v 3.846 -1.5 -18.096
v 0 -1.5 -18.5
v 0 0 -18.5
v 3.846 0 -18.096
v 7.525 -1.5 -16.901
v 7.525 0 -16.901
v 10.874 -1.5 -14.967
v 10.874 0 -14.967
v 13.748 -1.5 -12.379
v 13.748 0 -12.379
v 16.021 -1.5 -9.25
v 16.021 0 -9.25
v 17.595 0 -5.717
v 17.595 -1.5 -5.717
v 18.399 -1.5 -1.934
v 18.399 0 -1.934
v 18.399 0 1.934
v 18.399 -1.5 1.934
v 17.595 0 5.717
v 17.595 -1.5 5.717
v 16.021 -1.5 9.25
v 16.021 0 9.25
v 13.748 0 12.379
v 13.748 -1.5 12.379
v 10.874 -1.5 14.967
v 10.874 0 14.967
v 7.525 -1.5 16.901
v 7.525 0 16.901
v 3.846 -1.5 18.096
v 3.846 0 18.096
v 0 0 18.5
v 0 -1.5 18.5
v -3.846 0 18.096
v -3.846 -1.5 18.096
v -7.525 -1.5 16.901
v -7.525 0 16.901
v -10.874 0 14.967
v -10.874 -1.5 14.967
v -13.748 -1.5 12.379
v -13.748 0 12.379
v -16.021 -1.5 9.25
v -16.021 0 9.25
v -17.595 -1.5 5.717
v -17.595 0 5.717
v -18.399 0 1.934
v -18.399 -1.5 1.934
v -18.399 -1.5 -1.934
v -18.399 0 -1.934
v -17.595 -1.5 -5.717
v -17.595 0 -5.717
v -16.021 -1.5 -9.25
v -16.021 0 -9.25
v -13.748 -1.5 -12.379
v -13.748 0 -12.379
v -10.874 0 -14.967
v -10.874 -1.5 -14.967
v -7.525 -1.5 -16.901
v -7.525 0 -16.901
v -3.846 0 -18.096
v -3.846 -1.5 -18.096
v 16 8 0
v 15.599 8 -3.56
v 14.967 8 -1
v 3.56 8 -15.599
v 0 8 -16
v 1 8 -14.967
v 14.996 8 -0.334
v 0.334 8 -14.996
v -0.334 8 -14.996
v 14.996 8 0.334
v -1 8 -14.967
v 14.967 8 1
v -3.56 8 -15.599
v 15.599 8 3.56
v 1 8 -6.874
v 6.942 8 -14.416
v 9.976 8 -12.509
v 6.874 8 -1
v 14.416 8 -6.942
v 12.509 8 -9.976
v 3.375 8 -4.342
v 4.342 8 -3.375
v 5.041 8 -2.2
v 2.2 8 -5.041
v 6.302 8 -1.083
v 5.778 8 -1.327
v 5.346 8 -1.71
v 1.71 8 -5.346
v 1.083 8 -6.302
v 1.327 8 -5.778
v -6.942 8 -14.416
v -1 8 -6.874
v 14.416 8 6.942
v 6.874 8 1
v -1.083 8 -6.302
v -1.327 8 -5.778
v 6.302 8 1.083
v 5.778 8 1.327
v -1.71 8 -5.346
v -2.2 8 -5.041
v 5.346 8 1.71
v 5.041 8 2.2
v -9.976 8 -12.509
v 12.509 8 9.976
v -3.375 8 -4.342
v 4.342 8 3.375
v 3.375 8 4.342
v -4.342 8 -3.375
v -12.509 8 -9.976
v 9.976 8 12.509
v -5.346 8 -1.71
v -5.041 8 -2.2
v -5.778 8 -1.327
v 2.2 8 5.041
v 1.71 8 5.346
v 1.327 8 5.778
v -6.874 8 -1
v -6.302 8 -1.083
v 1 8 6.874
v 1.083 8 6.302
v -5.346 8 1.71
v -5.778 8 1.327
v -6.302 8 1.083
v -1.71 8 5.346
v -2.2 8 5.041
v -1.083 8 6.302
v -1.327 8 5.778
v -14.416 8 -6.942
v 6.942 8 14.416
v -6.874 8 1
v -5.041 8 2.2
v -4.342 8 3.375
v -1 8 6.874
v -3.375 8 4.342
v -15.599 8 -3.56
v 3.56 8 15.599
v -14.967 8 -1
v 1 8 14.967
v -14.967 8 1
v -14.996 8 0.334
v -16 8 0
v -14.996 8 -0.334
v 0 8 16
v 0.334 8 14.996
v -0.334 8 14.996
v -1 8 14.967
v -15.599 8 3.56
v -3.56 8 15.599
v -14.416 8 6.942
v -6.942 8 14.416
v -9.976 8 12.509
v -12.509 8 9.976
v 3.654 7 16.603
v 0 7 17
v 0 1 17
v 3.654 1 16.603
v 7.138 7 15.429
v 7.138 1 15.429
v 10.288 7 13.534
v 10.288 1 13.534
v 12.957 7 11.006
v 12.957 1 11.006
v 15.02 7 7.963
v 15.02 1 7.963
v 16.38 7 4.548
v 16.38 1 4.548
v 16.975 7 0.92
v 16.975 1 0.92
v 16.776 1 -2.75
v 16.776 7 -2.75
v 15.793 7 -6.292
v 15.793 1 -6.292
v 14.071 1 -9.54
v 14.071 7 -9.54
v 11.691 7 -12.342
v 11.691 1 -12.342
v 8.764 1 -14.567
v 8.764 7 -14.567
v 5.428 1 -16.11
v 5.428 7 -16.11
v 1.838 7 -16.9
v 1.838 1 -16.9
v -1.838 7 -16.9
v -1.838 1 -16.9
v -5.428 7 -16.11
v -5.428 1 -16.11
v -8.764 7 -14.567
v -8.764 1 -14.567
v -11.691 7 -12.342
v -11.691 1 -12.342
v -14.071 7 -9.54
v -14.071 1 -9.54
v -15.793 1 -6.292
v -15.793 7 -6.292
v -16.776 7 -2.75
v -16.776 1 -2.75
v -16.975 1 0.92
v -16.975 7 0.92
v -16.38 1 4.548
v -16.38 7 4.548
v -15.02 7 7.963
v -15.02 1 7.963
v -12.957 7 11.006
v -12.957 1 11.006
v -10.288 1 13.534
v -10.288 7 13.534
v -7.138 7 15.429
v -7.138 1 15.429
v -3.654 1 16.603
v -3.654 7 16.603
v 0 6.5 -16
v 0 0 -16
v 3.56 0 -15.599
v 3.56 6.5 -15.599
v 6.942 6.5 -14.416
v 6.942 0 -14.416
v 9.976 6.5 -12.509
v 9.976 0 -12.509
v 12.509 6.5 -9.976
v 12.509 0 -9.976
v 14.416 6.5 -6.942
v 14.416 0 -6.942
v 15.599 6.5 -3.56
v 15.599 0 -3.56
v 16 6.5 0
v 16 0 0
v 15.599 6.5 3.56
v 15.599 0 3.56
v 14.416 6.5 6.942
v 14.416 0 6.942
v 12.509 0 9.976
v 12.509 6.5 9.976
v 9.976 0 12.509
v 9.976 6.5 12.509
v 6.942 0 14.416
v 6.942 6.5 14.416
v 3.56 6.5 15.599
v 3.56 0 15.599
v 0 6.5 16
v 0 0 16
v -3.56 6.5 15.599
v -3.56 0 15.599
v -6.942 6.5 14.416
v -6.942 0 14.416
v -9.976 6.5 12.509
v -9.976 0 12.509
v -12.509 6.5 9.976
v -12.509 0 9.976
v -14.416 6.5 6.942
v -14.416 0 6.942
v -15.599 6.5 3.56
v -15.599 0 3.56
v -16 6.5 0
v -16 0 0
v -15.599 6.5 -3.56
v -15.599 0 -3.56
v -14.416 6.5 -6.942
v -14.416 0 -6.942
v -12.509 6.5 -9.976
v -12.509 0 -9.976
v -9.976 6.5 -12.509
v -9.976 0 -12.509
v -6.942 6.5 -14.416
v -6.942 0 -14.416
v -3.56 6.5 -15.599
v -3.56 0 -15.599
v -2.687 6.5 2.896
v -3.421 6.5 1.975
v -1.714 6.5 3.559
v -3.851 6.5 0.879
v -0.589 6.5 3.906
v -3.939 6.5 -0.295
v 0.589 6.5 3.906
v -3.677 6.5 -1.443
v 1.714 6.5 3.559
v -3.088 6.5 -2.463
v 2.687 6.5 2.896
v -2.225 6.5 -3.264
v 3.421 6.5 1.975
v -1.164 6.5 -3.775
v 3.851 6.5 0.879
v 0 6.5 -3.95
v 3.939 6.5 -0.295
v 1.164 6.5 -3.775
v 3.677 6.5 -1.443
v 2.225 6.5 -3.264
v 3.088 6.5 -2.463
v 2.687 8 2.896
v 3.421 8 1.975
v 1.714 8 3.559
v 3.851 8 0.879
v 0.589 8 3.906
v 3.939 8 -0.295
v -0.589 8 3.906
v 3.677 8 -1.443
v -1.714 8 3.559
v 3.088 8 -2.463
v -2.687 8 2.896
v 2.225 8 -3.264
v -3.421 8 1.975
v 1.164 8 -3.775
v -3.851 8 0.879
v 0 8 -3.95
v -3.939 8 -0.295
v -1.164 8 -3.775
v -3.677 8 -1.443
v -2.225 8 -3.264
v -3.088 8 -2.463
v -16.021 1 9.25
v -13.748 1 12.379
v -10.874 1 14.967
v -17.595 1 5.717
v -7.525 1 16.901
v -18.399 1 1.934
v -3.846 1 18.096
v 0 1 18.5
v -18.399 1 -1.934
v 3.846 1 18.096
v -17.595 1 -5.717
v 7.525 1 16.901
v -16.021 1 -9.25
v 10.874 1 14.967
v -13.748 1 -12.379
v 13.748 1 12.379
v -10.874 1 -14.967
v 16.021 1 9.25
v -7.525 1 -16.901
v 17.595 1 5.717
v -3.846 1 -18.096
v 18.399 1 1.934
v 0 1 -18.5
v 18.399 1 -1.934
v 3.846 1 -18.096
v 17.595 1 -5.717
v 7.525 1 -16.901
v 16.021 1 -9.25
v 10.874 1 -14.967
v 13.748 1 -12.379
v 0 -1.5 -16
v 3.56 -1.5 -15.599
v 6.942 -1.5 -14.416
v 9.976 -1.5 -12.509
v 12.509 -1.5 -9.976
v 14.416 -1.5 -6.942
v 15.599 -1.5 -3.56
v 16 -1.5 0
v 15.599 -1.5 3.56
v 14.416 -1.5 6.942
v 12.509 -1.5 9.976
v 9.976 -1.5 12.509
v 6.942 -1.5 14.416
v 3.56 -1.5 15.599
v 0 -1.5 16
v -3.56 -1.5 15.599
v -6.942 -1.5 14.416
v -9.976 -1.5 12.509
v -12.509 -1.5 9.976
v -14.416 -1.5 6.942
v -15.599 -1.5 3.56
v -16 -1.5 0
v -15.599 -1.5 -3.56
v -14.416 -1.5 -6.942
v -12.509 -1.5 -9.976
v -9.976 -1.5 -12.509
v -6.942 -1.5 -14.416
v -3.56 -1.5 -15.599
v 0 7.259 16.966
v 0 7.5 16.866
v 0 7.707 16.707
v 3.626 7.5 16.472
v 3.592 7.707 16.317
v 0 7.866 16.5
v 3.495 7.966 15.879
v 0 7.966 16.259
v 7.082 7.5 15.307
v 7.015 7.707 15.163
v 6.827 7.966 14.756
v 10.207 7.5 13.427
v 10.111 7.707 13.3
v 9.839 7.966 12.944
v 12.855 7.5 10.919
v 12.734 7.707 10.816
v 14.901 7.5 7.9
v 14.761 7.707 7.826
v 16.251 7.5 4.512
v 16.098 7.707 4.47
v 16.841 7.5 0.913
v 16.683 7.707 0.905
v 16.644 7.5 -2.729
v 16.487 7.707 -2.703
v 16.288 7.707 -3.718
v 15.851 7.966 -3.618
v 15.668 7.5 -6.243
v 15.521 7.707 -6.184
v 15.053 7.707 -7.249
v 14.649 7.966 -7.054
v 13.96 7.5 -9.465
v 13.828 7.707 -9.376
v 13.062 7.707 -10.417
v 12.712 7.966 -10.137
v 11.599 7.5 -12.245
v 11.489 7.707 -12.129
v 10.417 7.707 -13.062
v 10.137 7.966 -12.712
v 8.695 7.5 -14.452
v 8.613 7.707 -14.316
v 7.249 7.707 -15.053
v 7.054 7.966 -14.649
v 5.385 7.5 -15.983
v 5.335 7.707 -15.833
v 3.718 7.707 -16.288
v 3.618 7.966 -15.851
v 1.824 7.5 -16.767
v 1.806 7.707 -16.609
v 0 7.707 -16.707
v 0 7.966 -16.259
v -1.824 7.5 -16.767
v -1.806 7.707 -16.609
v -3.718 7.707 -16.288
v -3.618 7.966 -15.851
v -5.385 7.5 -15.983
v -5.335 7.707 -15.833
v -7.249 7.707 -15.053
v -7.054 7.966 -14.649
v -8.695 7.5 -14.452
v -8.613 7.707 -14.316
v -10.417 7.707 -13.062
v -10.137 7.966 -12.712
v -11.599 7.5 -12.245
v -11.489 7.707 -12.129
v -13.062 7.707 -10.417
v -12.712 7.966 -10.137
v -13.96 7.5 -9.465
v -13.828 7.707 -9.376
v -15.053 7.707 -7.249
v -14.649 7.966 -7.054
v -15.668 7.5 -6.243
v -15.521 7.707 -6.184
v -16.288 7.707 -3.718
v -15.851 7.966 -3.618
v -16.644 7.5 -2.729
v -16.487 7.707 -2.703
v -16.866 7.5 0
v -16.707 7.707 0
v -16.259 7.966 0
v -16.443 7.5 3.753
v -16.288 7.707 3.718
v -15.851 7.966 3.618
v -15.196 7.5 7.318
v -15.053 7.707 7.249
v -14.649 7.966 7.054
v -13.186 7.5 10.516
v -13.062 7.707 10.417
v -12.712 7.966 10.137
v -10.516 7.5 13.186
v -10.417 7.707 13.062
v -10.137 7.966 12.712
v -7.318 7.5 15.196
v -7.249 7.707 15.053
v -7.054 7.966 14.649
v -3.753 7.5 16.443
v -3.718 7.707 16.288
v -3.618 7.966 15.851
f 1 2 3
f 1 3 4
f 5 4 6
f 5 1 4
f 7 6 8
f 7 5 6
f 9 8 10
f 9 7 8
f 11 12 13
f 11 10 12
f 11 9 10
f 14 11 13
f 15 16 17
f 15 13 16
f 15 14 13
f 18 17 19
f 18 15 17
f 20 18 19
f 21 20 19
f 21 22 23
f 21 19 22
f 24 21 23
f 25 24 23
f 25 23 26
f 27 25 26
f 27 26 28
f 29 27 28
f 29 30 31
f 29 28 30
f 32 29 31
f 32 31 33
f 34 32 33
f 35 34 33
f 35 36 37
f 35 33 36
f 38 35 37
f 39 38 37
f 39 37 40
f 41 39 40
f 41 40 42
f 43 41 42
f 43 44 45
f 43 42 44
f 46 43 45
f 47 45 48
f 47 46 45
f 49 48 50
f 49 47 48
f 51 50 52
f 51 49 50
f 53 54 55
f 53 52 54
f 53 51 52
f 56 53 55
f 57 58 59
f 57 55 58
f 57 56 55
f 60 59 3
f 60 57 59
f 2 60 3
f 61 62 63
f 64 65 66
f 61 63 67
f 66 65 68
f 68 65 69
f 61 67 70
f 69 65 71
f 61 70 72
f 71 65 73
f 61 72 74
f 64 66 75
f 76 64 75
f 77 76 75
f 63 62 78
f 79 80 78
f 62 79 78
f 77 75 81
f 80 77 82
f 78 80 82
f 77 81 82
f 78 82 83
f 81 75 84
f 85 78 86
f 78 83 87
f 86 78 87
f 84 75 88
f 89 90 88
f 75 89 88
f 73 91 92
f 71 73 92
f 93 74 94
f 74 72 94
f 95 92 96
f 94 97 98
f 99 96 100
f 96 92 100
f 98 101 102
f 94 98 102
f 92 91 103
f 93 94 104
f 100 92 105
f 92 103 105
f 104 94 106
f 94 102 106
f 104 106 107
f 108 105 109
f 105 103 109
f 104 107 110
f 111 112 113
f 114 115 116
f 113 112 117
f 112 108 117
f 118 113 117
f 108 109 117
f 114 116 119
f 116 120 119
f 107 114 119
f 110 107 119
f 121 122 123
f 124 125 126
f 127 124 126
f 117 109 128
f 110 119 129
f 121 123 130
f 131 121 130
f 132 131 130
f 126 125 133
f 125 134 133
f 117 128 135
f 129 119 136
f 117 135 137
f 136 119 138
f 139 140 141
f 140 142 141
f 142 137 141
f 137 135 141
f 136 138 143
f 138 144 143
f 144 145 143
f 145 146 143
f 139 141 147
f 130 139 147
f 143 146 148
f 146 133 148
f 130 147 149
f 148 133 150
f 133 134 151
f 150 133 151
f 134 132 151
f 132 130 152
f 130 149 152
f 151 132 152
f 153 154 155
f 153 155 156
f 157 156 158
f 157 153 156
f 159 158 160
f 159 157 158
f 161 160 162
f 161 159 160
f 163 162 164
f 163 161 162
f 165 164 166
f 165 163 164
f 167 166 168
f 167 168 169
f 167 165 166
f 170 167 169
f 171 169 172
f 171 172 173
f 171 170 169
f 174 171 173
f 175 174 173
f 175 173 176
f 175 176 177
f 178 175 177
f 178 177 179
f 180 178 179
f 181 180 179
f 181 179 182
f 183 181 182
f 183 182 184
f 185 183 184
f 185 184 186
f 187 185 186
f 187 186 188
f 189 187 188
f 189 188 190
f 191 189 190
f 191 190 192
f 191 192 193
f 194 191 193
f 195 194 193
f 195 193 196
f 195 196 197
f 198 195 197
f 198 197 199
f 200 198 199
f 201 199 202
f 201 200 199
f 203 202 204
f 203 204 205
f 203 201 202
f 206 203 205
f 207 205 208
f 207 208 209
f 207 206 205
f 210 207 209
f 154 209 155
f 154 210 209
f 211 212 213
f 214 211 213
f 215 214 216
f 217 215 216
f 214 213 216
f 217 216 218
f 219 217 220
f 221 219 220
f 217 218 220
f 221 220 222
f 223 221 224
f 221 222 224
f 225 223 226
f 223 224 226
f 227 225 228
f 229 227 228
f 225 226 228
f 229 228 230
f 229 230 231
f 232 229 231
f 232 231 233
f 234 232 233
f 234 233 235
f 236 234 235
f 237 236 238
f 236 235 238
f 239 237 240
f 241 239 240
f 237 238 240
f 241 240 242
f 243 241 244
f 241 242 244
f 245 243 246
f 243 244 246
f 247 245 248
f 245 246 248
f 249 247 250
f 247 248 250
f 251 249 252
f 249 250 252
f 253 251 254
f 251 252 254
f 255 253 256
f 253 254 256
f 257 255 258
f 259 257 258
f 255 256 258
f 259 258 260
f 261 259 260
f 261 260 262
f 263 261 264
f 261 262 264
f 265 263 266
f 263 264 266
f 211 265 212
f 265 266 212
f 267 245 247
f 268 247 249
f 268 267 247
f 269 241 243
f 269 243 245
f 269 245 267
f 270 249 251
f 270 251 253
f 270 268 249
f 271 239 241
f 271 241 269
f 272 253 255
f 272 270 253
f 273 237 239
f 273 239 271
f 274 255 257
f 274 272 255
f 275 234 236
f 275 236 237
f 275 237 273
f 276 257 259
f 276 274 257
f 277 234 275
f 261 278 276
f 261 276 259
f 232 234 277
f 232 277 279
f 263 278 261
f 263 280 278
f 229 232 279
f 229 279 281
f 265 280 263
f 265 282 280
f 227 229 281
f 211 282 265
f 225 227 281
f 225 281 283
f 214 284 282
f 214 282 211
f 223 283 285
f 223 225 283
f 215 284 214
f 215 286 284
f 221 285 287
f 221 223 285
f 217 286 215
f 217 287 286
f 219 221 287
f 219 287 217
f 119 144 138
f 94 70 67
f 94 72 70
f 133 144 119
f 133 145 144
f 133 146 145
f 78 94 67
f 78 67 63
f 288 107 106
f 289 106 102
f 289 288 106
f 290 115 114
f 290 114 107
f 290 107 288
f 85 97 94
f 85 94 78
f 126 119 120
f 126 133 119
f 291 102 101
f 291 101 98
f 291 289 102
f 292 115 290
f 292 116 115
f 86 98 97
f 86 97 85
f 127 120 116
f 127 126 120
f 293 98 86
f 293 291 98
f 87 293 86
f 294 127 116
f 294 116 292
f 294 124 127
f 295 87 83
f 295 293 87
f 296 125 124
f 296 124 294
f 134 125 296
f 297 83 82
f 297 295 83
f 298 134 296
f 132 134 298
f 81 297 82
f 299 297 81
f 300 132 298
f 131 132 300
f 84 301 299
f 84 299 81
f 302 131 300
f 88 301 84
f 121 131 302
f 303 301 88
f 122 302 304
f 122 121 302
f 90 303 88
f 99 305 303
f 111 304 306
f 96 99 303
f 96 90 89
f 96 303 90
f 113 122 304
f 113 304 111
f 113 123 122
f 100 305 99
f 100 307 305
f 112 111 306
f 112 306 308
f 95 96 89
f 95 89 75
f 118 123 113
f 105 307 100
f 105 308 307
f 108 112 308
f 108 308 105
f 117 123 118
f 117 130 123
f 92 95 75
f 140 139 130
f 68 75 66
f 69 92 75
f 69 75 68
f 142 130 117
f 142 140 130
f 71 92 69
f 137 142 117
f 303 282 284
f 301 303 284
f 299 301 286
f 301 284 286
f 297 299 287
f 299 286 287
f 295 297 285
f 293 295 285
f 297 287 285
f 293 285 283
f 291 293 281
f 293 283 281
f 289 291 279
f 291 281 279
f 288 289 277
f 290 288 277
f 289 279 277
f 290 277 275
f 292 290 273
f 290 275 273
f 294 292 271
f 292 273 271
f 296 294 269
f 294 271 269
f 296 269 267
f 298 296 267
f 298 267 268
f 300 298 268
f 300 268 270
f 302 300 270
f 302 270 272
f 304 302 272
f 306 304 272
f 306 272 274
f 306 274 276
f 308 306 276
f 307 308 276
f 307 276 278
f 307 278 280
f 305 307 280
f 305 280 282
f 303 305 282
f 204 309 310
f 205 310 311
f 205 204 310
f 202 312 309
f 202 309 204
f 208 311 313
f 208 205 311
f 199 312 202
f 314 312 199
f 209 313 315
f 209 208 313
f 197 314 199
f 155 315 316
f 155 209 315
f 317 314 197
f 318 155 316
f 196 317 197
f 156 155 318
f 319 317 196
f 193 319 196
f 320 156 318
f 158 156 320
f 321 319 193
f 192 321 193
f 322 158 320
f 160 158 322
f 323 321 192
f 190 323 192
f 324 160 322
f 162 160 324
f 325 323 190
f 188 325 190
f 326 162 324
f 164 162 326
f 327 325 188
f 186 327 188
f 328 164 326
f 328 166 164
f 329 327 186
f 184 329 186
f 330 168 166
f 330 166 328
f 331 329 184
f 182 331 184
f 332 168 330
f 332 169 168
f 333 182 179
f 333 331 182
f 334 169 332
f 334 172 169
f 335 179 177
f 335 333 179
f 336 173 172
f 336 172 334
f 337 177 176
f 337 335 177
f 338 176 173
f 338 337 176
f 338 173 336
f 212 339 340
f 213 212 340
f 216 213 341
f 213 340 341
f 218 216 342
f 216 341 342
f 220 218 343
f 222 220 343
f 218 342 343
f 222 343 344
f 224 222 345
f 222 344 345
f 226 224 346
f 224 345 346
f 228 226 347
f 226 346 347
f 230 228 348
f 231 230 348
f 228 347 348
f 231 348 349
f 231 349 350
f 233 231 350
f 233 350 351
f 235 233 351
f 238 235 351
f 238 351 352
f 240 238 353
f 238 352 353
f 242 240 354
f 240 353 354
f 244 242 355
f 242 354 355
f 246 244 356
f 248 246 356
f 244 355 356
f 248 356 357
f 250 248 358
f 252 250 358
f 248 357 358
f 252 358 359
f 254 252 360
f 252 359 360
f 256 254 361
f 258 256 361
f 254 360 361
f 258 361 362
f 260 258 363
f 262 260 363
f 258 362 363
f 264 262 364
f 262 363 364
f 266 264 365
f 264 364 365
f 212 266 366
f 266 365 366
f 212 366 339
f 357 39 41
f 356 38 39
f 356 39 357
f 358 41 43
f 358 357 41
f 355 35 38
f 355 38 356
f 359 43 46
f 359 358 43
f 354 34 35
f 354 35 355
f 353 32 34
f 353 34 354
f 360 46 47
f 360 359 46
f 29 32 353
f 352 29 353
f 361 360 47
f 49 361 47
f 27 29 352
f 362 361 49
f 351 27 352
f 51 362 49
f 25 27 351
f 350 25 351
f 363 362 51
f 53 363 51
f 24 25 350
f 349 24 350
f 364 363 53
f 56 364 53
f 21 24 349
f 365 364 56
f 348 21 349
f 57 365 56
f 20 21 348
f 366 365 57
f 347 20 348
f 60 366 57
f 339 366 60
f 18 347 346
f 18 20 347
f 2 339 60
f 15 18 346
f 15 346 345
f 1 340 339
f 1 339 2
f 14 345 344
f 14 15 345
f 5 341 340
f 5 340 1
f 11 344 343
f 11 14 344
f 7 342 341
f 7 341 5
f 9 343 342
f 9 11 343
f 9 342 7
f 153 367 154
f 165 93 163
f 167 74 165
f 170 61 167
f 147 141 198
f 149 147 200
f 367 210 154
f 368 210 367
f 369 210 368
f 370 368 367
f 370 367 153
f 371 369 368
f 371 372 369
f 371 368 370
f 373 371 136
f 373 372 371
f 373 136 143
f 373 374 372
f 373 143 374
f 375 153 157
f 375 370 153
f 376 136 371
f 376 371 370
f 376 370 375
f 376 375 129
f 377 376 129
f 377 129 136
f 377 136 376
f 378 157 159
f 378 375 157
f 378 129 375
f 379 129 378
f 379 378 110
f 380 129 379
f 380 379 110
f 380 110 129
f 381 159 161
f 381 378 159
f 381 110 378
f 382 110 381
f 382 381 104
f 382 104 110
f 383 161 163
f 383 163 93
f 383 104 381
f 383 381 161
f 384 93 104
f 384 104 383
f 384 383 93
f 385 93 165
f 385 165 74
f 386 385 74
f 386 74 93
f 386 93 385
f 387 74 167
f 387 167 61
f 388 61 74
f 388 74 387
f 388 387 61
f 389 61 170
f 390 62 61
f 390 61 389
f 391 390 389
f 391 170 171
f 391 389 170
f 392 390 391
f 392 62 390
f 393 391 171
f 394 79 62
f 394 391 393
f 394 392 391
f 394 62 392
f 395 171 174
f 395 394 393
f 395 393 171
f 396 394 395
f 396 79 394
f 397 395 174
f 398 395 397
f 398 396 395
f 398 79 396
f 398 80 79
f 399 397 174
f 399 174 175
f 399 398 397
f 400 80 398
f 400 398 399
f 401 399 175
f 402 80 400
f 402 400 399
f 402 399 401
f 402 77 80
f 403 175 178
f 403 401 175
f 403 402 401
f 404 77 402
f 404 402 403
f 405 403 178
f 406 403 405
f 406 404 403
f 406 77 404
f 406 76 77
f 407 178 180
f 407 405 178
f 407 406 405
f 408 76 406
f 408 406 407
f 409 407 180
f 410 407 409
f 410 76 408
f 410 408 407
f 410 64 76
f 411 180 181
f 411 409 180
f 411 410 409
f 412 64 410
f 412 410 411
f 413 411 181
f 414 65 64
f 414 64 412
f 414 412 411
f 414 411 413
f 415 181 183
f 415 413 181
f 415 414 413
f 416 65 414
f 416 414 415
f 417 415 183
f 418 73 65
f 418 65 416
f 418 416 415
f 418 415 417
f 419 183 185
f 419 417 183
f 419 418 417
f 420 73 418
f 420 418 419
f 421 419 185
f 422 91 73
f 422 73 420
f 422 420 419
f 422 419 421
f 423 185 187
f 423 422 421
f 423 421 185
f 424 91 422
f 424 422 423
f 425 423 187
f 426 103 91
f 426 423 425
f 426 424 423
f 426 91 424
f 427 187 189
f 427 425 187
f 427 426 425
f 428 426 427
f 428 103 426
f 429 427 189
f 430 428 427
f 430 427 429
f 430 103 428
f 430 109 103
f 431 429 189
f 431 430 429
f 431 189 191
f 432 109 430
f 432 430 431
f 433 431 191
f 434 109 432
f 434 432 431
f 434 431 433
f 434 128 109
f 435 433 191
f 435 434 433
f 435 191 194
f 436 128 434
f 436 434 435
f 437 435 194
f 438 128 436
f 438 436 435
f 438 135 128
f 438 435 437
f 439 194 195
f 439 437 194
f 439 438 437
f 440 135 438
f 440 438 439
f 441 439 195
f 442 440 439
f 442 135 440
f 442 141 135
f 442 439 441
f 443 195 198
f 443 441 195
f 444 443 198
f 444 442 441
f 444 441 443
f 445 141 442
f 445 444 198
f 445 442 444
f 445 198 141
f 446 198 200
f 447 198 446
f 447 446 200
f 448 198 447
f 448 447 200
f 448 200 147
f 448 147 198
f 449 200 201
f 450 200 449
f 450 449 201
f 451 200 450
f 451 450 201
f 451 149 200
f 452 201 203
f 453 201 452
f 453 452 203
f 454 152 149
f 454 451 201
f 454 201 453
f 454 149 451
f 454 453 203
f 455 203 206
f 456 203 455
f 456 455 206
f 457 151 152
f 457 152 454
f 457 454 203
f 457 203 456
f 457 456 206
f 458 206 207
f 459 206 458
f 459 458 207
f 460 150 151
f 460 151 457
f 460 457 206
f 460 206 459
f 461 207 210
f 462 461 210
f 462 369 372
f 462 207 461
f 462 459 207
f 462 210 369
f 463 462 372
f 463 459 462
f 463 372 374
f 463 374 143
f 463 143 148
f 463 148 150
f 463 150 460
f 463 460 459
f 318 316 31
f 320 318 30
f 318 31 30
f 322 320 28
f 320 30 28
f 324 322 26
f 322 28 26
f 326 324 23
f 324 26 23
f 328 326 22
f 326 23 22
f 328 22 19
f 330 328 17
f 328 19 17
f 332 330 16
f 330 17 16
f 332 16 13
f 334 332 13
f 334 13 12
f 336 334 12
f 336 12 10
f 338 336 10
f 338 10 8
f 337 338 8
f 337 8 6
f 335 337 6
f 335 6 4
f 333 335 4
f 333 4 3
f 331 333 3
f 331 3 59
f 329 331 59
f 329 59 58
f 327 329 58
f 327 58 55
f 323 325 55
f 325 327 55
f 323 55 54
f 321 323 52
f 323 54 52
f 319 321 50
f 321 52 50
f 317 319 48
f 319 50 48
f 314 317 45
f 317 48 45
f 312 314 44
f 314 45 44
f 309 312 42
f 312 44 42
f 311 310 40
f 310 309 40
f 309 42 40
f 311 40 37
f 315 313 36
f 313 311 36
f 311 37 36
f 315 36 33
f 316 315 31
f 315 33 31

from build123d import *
from build123d.topology import SkipClean

# Parameters (mm, degrees)
SKETCH_1_R          = 18.5
EXTRUDE_1_DEPTH     = 20
SKETCH_2_R          = 16
CUT_EXTRUDE_1_DEPTH = 6.5
SKETCH_3_R          = 3.95
CUT_EXTRUDE_2_DEPTH = 7
SKETCH_4_R          = 3
CUT_EXTRUDE_3_DEPTH = 17
SKETCH_5_R          = 25.146051565
SKETCH_5_R_2        = 17
CUT_EXTRUDE_4_DEPTH = 19
CUT_EXTRUDE_5_DEPTH = 12
FILLET_5_R          = 1
FILLET_7_R          = 2
CUT_EXTRUDE_6_REACH = 34.932
SKETCH_9_R          = 5.408326913
SKETCH_9_R_2        = 4.5
FILLET_8_R          = 0.8
EXTRUDE_START       = 1.5
SKETCH_10_R         = 18.5
SKETCH_10_R_2       = 16
EXTRUDE_2_DEPTH     = 1.5
SKETCH_11_R         = 16
CUT_EXTRUDE_7_DEPTH = 29.783675929


with BuildPart() as part:
    # 草图1 → 凸台-拉伸1 (new body)
    with BuildSketch(Plane(origin=(0, 0, 0), x_dir=(1, 0, 0), z_dir=(0, 1, 0))):
        with Locations(Location((0, 0, 0), (0, 0, 270))):
            Circle(SKETCH_1_R)
    extrude(amount=EXTRUDE_1_DEPTH)

    # 草图2 → 切除-拉伸1 (cut)
    with BuildSketch(Plane.XZ):
        with Locations(Location((0, 0, 0), (0, 0, 270))):
            Circle(SKETCH_2_R)
    extrude(amount=-CUT_EXTRUDE_1_DEPTH, mode=Mode.SUBTRACT)

    # 草图3 → 切除-拉伸2 (cut)
    with BuildSketch(Plane.XZ.offset(-6.5)):
        with Locations(Location((0, 0, 0), (0, 0, 270))):
            Circle(SKETCH_3_R)
    extrude(amount=-CUT_EXTRUDE_2_DEPTH, mode=Mode.SUBTRACT)

    # 草图4 → 切除-拉伸3 (cut)
    with BuildSketch(Plane.XZ.offset(-13.5)):
        with Locations(Location((0, 0, 0), (0, 0, 270))):
            Circle(SKETCH_4_R)
    extrude(amount=-CUT_EXTRUDE_3_DEPTH, mode=Mode.SUBTRACT)

    # 草图5 → 切除-拉伸4 (cut)
    with BuildSketch(Plane(origin=(0, 20, 0), x_dir=(1, 0, 0), z_dir=(0, 1, 0))):
        Circle(SKETCH_5_R)
        with Locations(Location((0, 0, 0), (0, 0, 270))):
            Circle(SKETCH_5_R_2, mode=Mode.SUBTRACT)
    extrude(amount=-CUT_EXTRUDE_4_DEPTH, mode=Mode.SUBTRACT)

    # 草图6 → 切除-拉伸5 (cut)
    with BuildSketch(Plane(origin=(0, 20, 0), x_dir=(1, 0, 0), z_dir=(0, 1, 0))):
        with BuildLine():
            Line((-1, 15.467708298), (-1, 5.408326913))
            ThreePointArc((-1, 5.408326913), (-3.889087297, 3.889087297), (-5.408326913, 1))
            Line((-5.408326913, 1), (-15.467708298, 1))
            ThreePointArc((-15.467708298, 1), (-10.960155108, 10.960155108), (-1, 15.467708298))
        make_face()
        with BuildLine():
            Line((1, 15.467708298), (1, 5.408326913))
            ThreePointArc((1, 5.408326913), (3.889087297, 3.889087297), (5.408326913, 1))
            Line((5.408326913, 1), (15.467708298, 1))
            ThreePointArc((15.467708298, 1), (10.960155108, 10.960155108), (1, 15.467708298))
        make_face()
        with BuildLine():
            Line((-15.467708298, -1), (-5.408326913, -1))
            ThreePointArc((-5.408326913, -1), (-3.889087297, -3.889087297), (-1, -5.408326913))
            Line((-1, -5.408326913), (-1, -15.467708298))
            ThreePointArc((-1, -15.467708298), (-10.960155108, -10.960155108), (-15.467708298, -1))
        make_face()
        with BuildLine():
            Line((1, -5.408326913), (1, -15.467708298))
            ThreePointArc((1, -15.467708298), (10.960155108, -10.960155108), (15.467708298, -1))
            Line((15.467708298, -1), (5.408326913, -1))
            ThreePointArc((5.408326913, -1), (3.889087297, -3.889087297), (1, -5.408326913))
        make_face()
    extrude(amount=-CUT_EXTRUDE_5_DEPTH, mode=Mode.SUBTRACT)

    # 草图8 → 切除-旋转2 (revolve, cut)
    with BuildSketch(Plane.XY, mode=Mode.PRIVATE) as cut_revolve_2_sk:
        Polygon((-19.272016982, 8), (-19.272016982, 20.821833332), (-5.408326913, 20.821833332), (-5.408326913, 16), (-15, 8), (-17, 8), align=None)
    revolve(cut_revolve_2_sk.sketch.rotate(Axis((0, 13.5, 0), (0, -1, 0)), 270), axis=Axis((0, 13.5, 0), (0, -1, 0)), mode=Mode.SUBTRACT)

    # 圆角5
    fillet_5_edges = [part.edges().sort_by_distance(p)[0] for p in [
        (0, 8, -17),
    ]]
    fillet(fillet_5_edges, radius=FILLET_5_R)

    # 圆角7
    fillet_7_edges = [part.edges().sort_by_distance(p)[0] for p in [
        (-1, 11.96176972, 5.408326913),
        (-5.408326913, 11.96176972, 1),
        (-5.408326913, 11.96176972, -1),
        (-1, 11.96176972, -5.408326913),
        (1, 11.96176972, -5.408326913),
        (5.408326913, 11.96176972, -1),
        (5.408326913, 11.96176972, 1),
        (1, 11.96176972, 5.408326913),
    ]]
    fillet(fillet_7_edges, radius=FILLET_7_R)

    # 切除-拉伸6: up to this cone (the profile starts outside it)
    with SkipClean():  # the faces are left unmerged after this step: merging them gives an invalid solid
        cut_extrude_6_end = Plane(origin=(0, 20, 0), z_dir=(0, -1, 0)).offset(-0.510850748) * Cone(1.199e-06, 43.828361396, 36.555341117, align=(Align.CENTER, Align.CENTER, Align.MIN), mode=Mode.PRIVATE)
        # 草图9 → 切除-拉伸6 (cut, up to the surface)
        with BuildSketch(Plane(origin=(0, 20, 0), x_dir=(1, 0, 0), z_dir=(0, 1, 0)), mode=Mode.PRIVATE) as cut_extrude_6_sk1:
            Circle(SKETCH_9_R)
            with Locations(Location((0, 0, 0), (0, 0, 270))):
                Circle(SKETCH_9_R_2, mode=Mode.SUBTRACT)
        cut_extrude_6_tool1 = extrude(cut_extrude_6_sk1.sketch, amount=-CUT_EXTRUDE_6_REACH, mode=Mode.PRIVATE) - cut_extrude_6_end
        add(cut_extrude_6_tool1.solids().sort_by_distance((-5.255356, 20, 0))[0], mode=Mode.SUBTRACT)

    # 圆角8
    fillet_8_edges = [part.edges().sort_by_distance(p)[0] for p in [
        (0, 20, -4.5),
    ]]
    fillet(fillet_8_edges, radius=FILLET_8_R)

    # 草图10 → 凸台-拉伸2 (add)
    with SkipClean():  # the faces are left unmerged after this step: merging them gives an invalid solid
        with BuildSketch(Plane.XZ.offset(EXTRUDE_START)):
            with Locations(Location((0, 0, 0), (0, 0, 270))):
                Circle(SKETCH_10_R)
            with Locations(Location((0, 0, 0), (0, 0, 270))):
                Circle(SKETCH_10_R_2, mode=Mode.SUBTRACT)
        extrude(amount=-EXTRUDE_2_DEPTH)

    # 草图11 → 切除-拉伸7 (cut, through all)
    with BuildSketch(Plane(origin=(0, 8, 0), x_dir=(1, 0, 0), z_dir=(0, 1, 0))):
        with Locations(Location((0, 0, 0), (0, 0, 90))):
            Circle(SKETCH_11_R)
    extrude(amount=CUT_EXTRUDE_7_DEPTH, mode=Mode.SUBTRACT)


solid = part.part
